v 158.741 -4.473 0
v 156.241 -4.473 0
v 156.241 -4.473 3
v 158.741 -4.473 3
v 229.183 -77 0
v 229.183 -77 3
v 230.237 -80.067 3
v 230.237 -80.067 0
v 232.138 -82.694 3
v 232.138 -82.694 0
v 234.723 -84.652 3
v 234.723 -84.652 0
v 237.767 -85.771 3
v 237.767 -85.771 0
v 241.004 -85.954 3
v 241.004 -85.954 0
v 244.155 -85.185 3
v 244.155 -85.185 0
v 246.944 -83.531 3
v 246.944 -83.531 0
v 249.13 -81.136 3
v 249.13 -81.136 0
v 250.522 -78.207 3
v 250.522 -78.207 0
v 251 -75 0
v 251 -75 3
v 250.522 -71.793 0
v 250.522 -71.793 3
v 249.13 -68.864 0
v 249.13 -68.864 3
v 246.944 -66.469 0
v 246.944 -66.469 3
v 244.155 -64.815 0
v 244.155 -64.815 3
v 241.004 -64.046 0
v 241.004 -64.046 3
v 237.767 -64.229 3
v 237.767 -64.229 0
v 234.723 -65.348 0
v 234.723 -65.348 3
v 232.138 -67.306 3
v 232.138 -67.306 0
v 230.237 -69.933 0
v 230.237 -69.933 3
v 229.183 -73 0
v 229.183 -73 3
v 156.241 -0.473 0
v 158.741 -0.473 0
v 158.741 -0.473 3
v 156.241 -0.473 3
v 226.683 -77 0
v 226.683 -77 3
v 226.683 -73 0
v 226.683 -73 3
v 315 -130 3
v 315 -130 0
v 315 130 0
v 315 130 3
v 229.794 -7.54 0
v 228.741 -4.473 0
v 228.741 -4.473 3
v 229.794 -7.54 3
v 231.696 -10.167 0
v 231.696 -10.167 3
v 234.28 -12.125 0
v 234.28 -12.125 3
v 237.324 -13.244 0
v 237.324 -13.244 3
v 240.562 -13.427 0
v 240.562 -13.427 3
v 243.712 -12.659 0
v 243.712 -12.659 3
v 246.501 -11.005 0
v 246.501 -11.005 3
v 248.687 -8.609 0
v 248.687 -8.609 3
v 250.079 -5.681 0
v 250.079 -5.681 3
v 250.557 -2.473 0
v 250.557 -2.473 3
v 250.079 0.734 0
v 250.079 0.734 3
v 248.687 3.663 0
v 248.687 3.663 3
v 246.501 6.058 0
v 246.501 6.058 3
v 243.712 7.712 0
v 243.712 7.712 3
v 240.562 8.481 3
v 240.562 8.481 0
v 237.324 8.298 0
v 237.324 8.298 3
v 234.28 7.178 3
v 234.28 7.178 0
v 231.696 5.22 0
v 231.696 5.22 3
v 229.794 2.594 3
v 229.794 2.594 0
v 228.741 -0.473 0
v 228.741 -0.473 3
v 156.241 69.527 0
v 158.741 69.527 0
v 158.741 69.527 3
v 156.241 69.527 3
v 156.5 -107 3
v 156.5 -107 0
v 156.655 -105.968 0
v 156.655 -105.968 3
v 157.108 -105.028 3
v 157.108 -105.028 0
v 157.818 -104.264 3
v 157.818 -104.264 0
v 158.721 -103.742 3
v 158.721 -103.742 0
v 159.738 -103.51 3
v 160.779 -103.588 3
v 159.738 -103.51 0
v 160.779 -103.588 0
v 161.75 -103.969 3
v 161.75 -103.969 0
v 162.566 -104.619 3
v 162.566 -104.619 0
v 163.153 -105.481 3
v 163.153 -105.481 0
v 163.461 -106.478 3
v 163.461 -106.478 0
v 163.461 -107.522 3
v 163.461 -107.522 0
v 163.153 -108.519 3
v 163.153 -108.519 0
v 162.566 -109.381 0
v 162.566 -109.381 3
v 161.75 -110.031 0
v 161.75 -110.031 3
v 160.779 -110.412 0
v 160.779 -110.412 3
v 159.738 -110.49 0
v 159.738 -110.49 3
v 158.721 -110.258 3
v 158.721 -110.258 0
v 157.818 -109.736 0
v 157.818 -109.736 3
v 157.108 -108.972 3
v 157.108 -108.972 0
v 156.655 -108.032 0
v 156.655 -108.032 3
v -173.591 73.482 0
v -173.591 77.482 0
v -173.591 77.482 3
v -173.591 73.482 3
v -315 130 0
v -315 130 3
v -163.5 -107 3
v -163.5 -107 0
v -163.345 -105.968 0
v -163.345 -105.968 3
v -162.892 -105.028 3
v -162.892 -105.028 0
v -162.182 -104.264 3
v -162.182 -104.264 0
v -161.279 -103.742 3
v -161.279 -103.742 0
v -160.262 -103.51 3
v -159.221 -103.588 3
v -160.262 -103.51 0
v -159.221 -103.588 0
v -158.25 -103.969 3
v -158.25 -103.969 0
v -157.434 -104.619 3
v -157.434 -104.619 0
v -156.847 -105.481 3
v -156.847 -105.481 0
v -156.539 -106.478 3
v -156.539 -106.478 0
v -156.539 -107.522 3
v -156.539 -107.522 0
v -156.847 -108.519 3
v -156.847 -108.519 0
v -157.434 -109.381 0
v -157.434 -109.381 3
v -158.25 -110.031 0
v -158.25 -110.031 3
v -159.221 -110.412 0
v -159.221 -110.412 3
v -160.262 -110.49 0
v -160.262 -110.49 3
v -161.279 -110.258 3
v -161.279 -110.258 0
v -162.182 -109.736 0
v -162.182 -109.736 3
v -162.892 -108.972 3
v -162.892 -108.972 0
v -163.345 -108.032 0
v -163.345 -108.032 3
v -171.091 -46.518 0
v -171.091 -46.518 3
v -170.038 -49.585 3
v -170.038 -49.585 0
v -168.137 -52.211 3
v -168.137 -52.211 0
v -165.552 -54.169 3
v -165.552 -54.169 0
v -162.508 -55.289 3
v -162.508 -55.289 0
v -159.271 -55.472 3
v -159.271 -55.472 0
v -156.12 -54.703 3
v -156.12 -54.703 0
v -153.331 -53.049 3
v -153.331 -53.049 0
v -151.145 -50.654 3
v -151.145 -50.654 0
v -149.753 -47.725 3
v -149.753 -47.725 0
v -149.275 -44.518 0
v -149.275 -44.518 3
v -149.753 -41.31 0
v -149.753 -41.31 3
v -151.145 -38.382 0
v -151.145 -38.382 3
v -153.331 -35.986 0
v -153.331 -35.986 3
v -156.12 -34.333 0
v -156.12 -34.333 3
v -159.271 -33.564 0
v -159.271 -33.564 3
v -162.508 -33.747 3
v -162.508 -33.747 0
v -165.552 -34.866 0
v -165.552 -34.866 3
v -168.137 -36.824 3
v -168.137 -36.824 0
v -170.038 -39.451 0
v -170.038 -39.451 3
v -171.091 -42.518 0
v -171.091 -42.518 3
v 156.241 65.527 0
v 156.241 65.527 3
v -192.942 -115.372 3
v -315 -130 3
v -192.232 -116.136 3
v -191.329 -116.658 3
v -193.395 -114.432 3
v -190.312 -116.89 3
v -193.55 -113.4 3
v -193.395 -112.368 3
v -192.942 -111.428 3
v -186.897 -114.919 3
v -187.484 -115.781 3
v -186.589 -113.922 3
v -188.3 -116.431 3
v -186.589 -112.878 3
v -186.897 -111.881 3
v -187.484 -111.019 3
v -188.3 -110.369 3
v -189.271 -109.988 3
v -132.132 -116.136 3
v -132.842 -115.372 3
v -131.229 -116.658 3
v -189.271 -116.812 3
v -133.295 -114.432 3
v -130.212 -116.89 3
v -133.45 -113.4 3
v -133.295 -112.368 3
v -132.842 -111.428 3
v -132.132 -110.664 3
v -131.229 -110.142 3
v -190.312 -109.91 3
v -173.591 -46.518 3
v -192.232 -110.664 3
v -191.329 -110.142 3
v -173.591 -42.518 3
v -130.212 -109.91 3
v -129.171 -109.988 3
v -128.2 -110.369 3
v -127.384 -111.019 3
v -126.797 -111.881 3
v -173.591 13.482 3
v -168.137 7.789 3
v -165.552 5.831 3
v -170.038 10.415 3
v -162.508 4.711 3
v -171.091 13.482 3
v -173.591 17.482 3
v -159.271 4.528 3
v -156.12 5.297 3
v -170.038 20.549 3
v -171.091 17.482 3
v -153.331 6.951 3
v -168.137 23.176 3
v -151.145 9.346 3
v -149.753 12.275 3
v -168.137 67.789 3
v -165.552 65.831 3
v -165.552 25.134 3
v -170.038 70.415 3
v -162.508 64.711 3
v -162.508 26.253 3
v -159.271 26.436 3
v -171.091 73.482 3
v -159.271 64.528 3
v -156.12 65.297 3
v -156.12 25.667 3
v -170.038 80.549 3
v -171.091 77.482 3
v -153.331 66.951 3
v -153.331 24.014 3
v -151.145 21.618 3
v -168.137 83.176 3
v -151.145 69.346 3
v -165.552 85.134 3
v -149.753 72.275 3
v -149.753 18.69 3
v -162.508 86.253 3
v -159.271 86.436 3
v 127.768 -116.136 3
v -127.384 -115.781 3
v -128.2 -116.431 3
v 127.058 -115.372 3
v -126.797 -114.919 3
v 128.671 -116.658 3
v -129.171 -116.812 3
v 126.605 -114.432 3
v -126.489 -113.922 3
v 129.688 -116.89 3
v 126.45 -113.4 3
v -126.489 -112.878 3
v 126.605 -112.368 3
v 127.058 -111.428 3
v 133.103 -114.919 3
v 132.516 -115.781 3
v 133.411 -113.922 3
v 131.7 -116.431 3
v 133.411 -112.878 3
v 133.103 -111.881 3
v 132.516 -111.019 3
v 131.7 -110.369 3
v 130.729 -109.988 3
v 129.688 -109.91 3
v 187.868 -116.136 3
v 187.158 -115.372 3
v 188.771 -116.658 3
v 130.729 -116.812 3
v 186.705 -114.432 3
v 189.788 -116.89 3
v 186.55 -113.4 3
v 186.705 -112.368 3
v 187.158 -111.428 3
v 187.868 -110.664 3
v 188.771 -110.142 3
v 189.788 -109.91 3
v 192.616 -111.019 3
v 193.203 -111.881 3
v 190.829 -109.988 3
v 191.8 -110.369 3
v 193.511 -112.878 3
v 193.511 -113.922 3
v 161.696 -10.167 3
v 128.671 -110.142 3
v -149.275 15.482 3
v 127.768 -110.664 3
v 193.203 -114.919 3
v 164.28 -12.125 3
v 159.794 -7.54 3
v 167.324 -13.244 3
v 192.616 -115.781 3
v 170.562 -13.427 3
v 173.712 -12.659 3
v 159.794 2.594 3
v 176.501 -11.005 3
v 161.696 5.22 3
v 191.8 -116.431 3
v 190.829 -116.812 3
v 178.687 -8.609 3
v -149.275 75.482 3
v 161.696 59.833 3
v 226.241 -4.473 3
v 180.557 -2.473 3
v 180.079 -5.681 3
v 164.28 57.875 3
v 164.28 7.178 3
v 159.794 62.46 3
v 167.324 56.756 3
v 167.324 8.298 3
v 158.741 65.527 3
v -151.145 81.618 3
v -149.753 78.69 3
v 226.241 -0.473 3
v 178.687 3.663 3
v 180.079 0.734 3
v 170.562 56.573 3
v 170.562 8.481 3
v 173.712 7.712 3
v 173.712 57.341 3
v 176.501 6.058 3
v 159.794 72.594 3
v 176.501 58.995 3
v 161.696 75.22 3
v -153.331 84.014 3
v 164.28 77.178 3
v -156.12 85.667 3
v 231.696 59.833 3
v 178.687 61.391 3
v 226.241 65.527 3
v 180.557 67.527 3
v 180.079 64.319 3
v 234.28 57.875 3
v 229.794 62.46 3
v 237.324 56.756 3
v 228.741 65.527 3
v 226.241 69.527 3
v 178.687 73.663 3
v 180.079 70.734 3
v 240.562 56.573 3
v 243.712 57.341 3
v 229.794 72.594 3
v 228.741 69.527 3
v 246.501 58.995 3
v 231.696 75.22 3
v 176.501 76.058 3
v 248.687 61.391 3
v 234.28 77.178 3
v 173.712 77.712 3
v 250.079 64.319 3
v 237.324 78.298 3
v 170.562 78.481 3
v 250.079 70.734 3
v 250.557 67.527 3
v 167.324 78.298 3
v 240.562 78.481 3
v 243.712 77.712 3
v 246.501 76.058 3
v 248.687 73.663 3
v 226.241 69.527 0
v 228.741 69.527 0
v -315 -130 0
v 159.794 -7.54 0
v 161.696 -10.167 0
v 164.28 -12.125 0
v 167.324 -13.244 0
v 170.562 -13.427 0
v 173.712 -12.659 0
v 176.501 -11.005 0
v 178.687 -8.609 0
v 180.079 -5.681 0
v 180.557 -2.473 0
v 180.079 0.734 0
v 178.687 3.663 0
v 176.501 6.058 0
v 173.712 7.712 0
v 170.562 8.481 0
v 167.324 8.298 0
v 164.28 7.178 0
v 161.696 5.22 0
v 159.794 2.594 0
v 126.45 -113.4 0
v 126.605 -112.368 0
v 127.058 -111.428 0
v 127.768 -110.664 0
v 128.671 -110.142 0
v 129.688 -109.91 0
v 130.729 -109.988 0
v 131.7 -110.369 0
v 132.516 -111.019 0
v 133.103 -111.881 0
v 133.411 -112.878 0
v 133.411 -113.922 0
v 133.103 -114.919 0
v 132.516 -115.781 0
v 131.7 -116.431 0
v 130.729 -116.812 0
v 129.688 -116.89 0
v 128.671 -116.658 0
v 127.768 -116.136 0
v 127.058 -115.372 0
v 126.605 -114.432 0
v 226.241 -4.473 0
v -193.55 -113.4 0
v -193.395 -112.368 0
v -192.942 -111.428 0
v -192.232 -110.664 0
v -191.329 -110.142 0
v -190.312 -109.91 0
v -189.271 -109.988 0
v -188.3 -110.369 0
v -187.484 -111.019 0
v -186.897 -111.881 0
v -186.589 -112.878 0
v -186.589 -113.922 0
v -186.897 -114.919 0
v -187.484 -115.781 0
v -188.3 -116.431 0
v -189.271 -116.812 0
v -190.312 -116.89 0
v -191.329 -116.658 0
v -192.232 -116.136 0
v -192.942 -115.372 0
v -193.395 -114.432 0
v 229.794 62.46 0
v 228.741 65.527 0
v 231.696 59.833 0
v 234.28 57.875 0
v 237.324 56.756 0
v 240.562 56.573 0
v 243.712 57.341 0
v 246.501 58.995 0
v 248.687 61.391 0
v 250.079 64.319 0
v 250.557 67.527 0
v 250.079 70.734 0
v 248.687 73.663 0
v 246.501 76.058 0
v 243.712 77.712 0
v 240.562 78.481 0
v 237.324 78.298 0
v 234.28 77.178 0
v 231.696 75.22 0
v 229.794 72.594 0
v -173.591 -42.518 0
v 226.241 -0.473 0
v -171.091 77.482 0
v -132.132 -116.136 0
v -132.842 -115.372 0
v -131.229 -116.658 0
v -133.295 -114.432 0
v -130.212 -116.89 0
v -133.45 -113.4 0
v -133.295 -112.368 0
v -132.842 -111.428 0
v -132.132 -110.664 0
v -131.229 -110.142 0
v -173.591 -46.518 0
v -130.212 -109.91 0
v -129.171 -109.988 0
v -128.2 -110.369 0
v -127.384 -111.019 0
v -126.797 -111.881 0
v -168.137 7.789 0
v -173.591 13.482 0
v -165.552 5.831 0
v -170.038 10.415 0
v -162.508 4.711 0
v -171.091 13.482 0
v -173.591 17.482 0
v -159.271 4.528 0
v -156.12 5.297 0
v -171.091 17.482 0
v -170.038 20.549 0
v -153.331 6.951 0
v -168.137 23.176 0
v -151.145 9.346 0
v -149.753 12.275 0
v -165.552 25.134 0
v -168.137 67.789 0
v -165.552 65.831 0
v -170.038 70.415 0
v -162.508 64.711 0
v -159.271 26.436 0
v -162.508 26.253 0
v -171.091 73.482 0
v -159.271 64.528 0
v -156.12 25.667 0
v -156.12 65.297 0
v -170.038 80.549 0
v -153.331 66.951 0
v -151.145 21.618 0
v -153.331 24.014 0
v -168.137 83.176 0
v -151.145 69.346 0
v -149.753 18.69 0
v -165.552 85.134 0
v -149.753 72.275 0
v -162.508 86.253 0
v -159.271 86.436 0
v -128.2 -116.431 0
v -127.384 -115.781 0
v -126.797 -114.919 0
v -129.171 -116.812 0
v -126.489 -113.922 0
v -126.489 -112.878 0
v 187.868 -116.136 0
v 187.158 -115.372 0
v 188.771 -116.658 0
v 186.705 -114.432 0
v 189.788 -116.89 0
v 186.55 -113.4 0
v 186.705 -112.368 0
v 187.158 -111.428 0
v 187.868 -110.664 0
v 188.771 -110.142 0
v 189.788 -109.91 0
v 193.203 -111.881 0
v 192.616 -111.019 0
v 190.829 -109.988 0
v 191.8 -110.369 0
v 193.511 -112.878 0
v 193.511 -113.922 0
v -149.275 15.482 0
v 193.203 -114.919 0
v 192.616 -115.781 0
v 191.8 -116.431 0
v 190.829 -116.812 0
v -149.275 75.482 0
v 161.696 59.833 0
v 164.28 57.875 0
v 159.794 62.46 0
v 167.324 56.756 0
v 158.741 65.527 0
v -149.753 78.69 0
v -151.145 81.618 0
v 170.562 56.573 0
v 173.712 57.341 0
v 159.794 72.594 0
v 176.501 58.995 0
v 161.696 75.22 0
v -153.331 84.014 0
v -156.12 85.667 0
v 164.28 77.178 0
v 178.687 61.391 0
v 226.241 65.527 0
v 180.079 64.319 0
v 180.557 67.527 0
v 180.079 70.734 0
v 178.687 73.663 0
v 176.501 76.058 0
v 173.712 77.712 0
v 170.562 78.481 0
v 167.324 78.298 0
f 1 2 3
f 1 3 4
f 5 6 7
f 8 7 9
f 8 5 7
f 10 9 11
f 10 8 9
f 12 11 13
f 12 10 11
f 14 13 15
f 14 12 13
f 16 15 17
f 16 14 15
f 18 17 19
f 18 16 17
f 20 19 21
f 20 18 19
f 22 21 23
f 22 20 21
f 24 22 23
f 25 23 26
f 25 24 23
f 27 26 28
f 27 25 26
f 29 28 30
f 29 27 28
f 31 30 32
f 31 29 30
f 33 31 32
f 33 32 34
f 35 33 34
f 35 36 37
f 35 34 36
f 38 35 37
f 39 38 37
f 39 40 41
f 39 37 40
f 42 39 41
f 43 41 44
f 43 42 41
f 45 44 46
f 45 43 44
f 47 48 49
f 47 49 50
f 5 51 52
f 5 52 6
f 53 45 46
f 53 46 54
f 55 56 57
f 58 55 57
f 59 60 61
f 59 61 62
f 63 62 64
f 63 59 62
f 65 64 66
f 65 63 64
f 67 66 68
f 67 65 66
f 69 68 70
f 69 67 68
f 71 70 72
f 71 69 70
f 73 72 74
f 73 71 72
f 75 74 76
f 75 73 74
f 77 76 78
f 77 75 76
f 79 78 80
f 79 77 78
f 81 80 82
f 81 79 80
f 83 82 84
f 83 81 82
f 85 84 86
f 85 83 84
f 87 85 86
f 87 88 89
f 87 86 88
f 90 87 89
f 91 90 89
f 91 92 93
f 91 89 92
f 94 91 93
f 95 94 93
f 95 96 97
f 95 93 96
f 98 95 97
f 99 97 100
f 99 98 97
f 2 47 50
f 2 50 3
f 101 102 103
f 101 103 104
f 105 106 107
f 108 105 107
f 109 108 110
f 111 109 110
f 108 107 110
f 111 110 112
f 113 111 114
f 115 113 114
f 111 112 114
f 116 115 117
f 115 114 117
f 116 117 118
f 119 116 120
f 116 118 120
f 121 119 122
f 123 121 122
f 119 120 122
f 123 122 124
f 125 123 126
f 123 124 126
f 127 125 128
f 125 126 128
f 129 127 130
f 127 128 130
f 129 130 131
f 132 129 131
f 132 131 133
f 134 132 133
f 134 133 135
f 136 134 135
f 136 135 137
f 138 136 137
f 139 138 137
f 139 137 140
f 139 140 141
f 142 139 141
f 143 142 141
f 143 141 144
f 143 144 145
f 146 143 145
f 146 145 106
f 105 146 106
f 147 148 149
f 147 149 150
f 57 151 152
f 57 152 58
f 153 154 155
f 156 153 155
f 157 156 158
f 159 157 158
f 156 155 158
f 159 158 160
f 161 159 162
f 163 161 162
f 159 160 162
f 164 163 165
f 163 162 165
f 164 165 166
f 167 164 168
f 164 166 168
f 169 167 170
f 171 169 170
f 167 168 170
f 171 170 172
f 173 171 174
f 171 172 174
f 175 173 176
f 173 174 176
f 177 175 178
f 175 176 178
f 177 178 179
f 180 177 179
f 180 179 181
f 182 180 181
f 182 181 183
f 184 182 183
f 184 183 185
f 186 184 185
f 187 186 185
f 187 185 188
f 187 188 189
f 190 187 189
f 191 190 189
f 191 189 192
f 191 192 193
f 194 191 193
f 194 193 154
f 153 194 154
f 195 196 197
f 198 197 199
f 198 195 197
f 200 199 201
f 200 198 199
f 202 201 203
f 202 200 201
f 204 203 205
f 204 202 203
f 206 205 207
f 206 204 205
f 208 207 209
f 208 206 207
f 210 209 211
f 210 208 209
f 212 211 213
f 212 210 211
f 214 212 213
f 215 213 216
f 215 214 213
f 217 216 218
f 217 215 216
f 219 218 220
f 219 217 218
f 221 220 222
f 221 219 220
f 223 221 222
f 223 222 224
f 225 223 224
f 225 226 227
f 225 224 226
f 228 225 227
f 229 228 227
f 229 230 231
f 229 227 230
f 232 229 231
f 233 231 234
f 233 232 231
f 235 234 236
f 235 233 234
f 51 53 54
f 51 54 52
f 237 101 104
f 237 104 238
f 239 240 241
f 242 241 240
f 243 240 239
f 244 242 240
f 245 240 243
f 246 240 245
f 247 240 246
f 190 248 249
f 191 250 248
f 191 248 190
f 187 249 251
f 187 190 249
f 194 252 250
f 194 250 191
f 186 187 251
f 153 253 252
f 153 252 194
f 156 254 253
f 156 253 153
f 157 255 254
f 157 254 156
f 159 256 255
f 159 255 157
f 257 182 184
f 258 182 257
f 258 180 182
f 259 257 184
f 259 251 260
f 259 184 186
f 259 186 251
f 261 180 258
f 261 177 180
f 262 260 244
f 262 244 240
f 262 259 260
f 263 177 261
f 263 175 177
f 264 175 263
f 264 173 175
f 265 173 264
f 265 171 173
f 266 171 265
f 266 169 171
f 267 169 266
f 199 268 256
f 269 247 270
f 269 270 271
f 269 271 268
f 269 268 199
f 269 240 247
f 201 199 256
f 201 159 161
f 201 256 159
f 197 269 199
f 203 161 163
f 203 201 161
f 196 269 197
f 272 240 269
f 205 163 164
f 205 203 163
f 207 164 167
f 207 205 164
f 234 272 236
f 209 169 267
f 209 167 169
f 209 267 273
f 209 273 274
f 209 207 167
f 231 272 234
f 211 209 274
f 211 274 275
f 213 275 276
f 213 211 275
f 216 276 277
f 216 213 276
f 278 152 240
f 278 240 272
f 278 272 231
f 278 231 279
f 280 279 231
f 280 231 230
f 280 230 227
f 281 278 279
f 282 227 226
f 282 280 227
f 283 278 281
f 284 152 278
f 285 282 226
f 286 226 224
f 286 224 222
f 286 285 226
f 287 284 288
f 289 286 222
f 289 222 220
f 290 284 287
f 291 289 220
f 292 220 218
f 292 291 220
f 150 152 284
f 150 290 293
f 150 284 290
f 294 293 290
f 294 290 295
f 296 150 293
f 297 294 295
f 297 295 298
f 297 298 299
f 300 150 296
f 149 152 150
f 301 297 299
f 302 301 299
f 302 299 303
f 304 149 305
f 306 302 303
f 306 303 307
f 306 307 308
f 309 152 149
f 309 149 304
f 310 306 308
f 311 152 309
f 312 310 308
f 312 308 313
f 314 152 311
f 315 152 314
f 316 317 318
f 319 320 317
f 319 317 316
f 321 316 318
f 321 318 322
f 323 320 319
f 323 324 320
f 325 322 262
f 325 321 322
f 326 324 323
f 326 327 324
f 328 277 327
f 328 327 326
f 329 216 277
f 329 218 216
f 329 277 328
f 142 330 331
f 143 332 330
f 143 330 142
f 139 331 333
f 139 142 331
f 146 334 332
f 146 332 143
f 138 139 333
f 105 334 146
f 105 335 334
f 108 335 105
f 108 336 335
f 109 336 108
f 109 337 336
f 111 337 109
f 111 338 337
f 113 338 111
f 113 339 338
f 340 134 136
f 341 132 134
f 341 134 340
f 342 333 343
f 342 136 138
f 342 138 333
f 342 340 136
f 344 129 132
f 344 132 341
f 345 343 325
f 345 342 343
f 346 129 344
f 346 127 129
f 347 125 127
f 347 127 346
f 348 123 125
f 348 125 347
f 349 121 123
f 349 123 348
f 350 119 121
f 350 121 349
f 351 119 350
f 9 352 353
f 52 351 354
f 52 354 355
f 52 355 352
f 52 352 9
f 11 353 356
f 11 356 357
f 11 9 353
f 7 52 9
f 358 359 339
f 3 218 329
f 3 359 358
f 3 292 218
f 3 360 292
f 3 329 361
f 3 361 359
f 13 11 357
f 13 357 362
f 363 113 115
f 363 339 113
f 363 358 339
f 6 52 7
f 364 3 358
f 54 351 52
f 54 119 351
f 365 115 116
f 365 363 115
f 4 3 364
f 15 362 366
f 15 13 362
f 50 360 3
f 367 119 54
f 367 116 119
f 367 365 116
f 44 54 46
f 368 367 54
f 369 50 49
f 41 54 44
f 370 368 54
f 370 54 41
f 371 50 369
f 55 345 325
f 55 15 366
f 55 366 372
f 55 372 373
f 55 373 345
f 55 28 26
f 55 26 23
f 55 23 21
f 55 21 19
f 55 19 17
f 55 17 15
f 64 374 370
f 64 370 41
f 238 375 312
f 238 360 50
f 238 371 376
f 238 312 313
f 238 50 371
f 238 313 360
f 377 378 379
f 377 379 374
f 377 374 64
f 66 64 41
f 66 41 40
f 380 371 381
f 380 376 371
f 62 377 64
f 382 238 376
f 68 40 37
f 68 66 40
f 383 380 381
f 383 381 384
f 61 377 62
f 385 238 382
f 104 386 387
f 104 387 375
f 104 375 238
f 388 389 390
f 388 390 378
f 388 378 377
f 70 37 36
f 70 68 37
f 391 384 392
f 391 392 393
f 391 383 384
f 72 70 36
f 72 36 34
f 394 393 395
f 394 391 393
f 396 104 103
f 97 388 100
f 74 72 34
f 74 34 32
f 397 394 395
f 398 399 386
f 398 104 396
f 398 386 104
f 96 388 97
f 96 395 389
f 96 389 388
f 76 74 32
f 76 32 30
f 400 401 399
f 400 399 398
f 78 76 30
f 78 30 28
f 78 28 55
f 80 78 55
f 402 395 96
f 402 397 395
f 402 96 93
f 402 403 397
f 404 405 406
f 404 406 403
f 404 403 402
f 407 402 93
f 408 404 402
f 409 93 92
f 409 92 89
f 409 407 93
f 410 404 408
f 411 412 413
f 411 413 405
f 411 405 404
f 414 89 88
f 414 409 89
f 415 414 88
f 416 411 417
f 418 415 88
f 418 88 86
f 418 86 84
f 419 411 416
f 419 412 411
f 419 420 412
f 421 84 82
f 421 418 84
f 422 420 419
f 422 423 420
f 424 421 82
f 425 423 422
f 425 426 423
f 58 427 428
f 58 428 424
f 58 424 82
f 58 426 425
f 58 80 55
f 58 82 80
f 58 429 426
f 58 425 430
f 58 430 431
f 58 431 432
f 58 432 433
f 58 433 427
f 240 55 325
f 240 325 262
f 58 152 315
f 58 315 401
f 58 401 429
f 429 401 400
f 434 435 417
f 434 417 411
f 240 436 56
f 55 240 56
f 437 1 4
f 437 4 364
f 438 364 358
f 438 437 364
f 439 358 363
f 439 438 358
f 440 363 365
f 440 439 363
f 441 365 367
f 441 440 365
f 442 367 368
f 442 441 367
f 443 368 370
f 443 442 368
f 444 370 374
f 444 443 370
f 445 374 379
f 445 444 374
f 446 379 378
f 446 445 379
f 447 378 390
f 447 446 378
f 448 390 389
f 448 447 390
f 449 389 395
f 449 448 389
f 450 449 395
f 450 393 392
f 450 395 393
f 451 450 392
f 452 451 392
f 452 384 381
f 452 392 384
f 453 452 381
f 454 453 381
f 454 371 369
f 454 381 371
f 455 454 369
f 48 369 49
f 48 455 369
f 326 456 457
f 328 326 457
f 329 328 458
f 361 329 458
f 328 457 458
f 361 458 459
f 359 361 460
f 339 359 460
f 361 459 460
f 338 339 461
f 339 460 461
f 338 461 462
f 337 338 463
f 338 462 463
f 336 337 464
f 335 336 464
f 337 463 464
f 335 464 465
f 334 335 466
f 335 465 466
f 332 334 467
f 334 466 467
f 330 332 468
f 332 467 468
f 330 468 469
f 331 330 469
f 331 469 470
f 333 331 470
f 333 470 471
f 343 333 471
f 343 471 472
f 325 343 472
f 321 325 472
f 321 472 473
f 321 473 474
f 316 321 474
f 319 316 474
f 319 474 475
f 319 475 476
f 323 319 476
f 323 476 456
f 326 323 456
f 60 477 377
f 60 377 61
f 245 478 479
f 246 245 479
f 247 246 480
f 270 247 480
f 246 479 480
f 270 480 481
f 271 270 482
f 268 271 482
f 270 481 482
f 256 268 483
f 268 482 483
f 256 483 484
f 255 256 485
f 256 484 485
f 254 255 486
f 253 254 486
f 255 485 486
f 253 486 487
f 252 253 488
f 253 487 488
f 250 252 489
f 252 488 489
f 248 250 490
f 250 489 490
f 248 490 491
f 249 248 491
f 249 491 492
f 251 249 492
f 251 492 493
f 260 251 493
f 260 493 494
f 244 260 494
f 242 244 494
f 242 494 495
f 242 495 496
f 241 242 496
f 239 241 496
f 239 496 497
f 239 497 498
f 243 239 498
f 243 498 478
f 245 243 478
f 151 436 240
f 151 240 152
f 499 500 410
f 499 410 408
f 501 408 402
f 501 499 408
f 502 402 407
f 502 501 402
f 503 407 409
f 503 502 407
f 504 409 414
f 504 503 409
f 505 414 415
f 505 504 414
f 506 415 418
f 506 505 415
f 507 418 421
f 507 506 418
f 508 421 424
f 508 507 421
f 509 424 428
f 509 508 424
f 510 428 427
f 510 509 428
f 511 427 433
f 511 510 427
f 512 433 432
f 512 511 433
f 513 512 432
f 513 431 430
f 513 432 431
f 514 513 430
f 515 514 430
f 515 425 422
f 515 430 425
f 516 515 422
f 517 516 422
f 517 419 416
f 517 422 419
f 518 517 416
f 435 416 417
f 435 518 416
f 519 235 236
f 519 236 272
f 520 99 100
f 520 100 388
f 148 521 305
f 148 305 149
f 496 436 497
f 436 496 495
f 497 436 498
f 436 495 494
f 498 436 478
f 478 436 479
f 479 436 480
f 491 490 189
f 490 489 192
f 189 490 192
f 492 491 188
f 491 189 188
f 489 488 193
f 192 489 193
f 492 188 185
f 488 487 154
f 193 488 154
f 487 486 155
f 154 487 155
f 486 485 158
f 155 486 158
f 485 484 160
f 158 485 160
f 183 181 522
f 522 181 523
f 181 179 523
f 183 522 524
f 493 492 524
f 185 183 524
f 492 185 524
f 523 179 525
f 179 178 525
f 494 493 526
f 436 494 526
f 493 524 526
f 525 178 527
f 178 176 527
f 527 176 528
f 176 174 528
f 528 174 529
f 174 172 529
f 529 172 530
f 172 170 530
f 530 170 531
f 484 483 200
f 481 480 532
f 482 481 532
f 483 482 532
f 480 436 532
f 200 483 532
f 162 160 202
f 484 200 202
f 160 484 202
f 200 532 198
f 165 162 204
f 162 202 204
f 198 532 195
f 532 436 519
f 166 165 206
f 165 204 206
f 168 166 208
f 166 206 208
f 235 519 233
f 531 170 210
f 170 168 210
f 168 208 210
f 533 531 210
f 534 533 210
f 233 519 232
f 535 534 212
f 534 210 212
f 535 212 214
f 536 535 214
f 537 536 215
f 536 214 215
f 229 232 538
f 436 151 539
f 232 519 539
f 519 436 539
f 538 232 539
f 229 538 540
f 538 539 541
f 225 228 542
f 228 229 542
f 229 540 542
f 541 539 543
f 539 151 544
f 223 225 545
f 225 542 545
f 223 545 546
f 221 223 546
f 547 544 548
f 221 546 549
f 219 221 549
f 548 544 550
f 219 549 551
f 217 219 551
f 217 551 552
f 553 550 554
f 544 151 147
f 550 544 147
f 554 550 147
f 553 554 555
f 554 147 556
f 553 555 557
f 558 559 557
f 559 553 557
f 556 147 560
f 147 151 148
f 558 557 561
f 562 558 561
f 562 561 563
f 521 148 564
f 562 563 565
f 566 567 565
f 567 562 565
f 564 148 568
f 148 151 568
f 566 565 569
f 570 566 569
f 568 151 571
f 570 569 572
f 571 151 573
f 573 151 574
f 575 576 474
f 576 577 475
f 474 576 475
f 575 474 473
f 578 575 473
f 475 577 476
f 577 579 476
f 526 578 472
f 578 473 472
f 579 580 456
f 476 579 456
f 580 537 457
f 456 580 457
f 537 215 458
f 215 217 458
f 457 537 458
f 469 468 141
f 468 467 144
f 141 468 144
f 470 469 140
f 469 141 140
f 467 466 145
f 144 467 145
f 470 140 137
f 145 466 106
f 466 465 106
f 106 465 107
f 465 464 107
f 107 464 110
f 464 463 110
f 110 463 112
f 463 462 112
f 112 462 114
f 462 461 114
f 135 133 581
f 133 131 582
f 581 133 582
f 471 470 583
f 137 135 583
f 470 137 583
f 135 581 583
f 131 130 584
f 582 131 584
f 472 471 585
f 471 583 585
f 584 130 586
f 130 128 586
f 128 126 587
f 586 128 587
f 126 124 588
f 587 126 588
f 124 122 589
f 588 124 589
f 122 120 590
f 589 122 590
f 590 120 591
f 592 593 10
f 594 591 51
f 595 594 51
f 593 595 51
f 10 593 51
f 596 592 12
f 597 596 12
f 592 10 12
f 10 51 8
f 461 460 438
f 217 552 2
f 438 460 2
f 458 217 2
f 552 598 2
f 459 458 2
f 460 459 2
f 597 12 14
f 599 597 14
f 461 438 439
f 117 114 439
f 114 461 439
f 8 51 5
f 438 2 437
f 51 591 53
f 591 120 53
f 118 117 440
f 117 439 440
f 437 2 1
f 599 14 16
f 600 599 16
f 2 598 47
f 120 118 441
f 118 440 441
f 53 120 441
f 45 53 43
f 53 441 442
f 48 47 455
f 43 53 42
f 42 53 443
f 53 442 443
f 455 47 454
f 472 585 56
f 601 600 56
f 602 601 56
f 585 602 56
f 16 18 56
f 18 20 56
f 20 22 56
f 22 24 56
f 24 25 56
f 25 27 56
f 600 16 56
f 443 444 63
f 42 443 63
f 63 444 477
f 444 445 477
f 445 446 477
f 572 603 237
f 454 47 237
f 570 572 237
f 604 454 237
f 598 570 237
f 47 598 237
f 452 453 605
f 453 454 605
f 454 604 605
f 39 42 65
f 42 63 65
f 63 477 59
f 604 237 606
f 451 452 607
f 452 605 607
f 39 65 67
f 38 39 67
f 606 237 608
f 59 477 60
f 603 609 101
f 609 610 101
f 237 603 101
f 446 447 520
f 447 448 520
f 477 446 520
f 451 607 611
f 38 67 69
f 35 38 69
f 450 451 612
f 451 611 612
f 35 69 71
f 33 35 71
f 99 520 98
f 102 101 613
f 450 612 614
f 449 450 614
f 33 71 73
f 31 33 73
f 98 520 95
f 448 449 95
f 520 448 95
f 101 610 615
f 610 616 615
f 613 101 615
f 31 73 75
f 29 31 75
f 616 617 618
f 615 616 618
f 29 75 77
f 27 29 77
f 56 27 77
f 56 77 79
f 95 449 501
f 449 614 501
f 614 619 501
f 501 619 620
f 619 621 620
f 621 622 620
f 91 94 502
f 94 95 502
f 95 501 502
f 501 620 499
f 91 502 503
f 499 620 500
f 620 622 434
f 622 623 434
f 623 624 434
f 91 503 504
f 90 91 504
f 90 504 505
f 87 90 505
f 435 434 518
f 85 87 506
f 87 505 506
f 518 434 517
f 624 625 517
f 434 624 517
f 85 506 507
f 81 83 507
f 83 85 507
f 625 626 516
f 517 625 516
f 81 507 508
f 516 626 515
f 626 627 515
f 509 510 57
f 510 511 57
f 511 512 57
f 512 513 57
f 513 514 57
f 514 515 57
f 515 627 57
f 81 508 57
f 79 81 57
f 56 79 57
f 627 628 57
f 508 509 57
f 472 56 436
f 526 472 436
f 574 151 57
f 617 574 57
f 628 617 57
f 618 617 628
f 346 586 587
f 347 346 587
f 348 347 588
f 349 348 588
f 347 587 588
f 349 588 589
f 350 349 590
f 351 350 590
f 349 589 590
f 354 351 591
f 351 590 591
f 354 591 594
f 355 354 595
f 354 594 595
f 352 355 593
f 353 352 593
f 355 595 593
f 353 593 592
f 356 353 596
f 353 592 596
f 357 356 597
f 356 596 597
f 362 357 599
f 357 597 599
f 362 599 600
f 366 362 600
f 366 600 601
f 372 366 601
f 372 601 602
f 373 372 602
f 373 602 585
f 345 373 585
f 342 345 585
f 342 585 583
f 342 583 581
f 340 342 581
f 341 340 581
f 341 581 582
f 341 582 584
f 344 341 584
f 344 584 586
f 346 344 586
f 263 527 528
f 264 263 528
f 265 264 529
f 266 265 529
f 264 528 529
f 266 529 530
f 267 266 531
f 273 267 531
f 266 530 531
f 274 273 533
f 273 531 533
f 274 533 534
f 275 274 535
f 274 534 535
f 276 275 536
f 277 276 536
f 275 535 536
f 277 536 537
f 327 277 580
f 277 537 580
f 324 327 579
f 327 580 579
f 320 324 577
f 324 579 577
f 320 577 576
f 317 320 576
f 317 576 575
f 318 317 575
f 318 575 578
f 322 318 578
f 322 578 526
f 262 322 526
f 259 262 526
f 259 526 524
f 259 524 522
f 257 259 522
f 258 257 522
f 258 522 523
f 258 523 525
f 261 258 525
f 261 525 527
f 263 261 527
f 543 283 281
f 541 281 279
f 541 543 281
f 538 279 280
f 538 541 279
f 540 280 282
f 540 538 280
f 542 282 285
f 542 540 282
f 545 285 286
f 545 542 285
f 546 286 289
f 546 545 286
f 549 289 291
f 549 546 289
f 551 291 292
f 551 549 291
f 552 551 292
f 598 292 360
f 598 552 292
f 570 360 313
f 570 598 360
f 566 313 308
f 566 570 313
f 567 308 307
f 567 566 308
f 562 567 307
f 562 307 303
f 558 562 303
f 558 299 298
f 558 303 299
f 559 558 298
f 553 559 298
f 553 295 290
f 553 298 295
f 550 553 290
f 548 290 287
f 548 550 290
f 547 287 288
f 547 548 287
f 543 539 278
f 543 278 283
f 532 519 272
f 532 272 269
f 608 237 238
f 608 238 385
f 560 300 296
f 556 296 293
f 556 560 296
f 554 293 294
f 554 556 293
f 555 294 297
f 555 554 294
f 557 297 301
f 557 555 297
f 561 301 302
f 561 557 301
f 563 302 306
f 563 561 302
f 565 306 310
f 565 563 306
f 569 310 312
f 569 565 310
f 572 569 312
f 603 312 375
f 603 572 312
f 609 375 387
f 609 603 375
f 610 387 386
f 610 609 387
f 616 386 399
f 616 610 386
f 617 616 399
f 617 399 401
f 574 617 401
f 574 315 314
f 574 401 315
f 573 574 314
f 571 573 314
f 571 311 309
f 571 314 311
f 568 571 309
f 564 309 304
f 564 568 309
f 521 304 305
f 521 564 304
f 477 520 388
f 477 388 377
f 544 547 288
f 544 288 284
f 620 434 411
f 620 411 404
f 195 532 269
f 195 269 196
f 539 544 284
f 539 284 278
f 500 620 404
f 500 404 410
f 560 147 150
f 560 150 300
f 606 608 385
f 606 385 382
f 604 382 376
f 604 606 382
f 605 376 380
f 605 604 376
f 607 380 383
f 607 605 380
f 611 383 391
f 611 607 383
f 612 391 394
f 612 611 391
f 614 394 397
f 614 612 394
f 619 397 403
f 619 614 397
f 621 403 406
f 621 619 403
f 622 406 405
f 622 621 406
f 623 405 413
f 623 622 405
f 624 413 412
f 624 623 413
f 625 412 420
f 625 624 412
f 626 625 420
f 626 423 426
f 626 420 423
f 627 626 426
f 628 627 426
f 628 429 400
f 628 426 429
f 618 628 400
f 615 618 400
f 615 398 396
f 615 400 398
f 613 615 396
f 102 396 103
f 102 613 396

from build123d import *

# Parameters (mm, degrees)
CROQUIS1_W              = 630
CROQUIS1_H              = 260
SALIENTE_EXTRUIR1_DEPTH = 3
CORTAR_EXTRUIR1_DEPTH   = 4


with BuildPart() as part:
    # Croquis1 → Saliente-Extruir1 (new body)
    with BuildSketch(Plane.XY):
        Rectangle(CROQUIS1_W, CROQUIS1_H)
    extrude(amount=SALIENTE_EXTRUIR1_DEPTH)

    # Croquis2 → Cortar-Extruir1 (cut, through all)
    with BuildSketch(Plane(origin=(0, 0, 0), x_dir=(-1, 0, 0), z_dir=(0, 0, -1))):
        with BuildLine():
            Line((-228.740712327, -0.473268561), (-226.240712327, -0.473268561))
            Line((-226.240712327, -0.473268561), (-226.240712327, -4.473268561))
            Line((-226.240712327, -4.473268561), (-228.740712327, -4.473268561))
            ThreePointArc((-228.740712327, -4.473268561), (-250.557366154, -2.473268561), (-228.740712327, -0.473268561))
        make_face()
        with BuildLine():
            Line((-229.183346174, -73), (-226.683346174, -73))
            Line((-226.683346174, -73), (-226.683346174, -77))
            Line((-226.683346174, -77), (-229.183346174, -77))
            ThreePointArc((-229.183346174, -77), (-251, -75), (-229.183346174, -73))
        make_face()
        with BuildLine():
            Line((-158.740712327, -0.473268561), (-156.240712327, -0.473268561))
            Line((-156.240712327, -0.473268561), (-156.240712327, -4.473268561))
            Line((-156.240712327, -4.473268561), (-158.740712327, -4.473268561))
            ThreePointArc((-158.740712327, -4.473268561), (-180.557366154, -2.473268561), (-158.740712327, -0.473268561))
        make_face()
        with BuildLine():
            Line((-158.740712327, 69.526731439), (-156.240712327, 69.526731439))
            Line((-156.240712327, 69.526731439), (-156.240712327, 65.526731439))
            Line((-156.240712327, 65.526731439), (-158.740712327, 65.526731439))
            ThreePointArc((-158.740712327, 65.526731439), (-180.557366154, 67.526731439), (-158.740712327, 69.526731439))
        make_face()
        with BuildLine():
            Line((-228.740712327, 69.526731439), (-226.240712327, 69.526731439))
            Line((-226.240712327, 69.526731439), (-226.240712327, 65.526731439))
            Line((-226.240712327, 65.526731439), (-228.740712327, 65.526731439))
            ThreePointArc((-228.740712327, 65.526731439), (-250.557366154, 67.526731439), (-228.740712327, 69.526731439))
        make_face()
        with BuildLine():
            Line((171.091386036, -42.517832578), (173.591386036, -42.517832578))
            Line((173.591386036, -42.517832578), (173.591386036, -46.517832578))
            Line((173.591386036, -46.517832578), (171.091386036, -46.517832578))
            ThreePointArc((171.091386036, -46.517832578), (149.27473221, -44.517832578), (171.091386036, -42.517832578))
        make_face()
        with BuildLine():
            Line((171.091386036, 17.482167422), (173.591386036, 17.482167422))
            Line((173.591386036, 17.482167422), (173.591386036, 13.482167422))
            Line((173.591386036, 13.482167422), (171.091386036, 13.482167422))
            ThreePointArc((171.091386036, 13.482167422), (149.27473221, 15.482167422), (171.091386036, 17.482167422))
        make_face()
        with BuildLine():
            Line((171.091386036, 77.482167422), (173.591386036, 77.482167422))
            Line((173.591386036, 77.482167422), (173.591386036, 73.482167422))
            Line((173.591386036, 73.482167422), (171.091386036, 73.482167422))
            ThreePointArc((171.091386036, 73.482167422), (149.27473221, 75.482167422), (171.091386036, 77.482167422))
        make_face()
        with BuildLine():
            ThreePointArc((-163.5, -107), (-160, -110.5), (-156.5, -107))
            ThreePointArc((-156.5, -107), (-160, -103.5), (-163.5, -107))
        make_face()
        with BuildLine():
            ThreePointArc((-133.45, -113.4), (-129.95, -116.9), (-126.45, -113.4))
            ThreePointArc((-126.45, -113.4), (-129.95, -109.9), (-133.45, -113.4))
        make_face()
        with BuildLine():
            ThreePointArc((126.45, -113.4), (129.95, -116.9), (133.45, -113.4))
            ThreePointArc((133.45, -113.4), (129.95, -109.9), (126.45, -113.4))
        make_face()
        with BuildLine():
            ThreePointArc((156.5, -107), (160, -110.5), (163.5, -107))
            ThreePointArc((163.5, -107), (160, -103.5), (156.5, -107))
        make_face()
        with BuildLine():
            ThreePointArc((186.55, -113.4), (190.05, -116.9), (193.55, -113.4))
            ThreePointArc((193.55, -113.4), (190.05, -109.9), (186.55, -113.4))
        make_face()
        with BuildLine():
            ThreePointArc((-193.55, -113.4), (-190.05, -116.9), (-186.55, -113.4))
            ThreePointArc((-186.55, -113.4), (-190.05, -109.9), (-193.55, -113.4))
        make_face()
    extrude(amount=-CORTAR_EXTRUIR1_DEPTH, mode=Mode.SUBTRACT)


solid = part.part
